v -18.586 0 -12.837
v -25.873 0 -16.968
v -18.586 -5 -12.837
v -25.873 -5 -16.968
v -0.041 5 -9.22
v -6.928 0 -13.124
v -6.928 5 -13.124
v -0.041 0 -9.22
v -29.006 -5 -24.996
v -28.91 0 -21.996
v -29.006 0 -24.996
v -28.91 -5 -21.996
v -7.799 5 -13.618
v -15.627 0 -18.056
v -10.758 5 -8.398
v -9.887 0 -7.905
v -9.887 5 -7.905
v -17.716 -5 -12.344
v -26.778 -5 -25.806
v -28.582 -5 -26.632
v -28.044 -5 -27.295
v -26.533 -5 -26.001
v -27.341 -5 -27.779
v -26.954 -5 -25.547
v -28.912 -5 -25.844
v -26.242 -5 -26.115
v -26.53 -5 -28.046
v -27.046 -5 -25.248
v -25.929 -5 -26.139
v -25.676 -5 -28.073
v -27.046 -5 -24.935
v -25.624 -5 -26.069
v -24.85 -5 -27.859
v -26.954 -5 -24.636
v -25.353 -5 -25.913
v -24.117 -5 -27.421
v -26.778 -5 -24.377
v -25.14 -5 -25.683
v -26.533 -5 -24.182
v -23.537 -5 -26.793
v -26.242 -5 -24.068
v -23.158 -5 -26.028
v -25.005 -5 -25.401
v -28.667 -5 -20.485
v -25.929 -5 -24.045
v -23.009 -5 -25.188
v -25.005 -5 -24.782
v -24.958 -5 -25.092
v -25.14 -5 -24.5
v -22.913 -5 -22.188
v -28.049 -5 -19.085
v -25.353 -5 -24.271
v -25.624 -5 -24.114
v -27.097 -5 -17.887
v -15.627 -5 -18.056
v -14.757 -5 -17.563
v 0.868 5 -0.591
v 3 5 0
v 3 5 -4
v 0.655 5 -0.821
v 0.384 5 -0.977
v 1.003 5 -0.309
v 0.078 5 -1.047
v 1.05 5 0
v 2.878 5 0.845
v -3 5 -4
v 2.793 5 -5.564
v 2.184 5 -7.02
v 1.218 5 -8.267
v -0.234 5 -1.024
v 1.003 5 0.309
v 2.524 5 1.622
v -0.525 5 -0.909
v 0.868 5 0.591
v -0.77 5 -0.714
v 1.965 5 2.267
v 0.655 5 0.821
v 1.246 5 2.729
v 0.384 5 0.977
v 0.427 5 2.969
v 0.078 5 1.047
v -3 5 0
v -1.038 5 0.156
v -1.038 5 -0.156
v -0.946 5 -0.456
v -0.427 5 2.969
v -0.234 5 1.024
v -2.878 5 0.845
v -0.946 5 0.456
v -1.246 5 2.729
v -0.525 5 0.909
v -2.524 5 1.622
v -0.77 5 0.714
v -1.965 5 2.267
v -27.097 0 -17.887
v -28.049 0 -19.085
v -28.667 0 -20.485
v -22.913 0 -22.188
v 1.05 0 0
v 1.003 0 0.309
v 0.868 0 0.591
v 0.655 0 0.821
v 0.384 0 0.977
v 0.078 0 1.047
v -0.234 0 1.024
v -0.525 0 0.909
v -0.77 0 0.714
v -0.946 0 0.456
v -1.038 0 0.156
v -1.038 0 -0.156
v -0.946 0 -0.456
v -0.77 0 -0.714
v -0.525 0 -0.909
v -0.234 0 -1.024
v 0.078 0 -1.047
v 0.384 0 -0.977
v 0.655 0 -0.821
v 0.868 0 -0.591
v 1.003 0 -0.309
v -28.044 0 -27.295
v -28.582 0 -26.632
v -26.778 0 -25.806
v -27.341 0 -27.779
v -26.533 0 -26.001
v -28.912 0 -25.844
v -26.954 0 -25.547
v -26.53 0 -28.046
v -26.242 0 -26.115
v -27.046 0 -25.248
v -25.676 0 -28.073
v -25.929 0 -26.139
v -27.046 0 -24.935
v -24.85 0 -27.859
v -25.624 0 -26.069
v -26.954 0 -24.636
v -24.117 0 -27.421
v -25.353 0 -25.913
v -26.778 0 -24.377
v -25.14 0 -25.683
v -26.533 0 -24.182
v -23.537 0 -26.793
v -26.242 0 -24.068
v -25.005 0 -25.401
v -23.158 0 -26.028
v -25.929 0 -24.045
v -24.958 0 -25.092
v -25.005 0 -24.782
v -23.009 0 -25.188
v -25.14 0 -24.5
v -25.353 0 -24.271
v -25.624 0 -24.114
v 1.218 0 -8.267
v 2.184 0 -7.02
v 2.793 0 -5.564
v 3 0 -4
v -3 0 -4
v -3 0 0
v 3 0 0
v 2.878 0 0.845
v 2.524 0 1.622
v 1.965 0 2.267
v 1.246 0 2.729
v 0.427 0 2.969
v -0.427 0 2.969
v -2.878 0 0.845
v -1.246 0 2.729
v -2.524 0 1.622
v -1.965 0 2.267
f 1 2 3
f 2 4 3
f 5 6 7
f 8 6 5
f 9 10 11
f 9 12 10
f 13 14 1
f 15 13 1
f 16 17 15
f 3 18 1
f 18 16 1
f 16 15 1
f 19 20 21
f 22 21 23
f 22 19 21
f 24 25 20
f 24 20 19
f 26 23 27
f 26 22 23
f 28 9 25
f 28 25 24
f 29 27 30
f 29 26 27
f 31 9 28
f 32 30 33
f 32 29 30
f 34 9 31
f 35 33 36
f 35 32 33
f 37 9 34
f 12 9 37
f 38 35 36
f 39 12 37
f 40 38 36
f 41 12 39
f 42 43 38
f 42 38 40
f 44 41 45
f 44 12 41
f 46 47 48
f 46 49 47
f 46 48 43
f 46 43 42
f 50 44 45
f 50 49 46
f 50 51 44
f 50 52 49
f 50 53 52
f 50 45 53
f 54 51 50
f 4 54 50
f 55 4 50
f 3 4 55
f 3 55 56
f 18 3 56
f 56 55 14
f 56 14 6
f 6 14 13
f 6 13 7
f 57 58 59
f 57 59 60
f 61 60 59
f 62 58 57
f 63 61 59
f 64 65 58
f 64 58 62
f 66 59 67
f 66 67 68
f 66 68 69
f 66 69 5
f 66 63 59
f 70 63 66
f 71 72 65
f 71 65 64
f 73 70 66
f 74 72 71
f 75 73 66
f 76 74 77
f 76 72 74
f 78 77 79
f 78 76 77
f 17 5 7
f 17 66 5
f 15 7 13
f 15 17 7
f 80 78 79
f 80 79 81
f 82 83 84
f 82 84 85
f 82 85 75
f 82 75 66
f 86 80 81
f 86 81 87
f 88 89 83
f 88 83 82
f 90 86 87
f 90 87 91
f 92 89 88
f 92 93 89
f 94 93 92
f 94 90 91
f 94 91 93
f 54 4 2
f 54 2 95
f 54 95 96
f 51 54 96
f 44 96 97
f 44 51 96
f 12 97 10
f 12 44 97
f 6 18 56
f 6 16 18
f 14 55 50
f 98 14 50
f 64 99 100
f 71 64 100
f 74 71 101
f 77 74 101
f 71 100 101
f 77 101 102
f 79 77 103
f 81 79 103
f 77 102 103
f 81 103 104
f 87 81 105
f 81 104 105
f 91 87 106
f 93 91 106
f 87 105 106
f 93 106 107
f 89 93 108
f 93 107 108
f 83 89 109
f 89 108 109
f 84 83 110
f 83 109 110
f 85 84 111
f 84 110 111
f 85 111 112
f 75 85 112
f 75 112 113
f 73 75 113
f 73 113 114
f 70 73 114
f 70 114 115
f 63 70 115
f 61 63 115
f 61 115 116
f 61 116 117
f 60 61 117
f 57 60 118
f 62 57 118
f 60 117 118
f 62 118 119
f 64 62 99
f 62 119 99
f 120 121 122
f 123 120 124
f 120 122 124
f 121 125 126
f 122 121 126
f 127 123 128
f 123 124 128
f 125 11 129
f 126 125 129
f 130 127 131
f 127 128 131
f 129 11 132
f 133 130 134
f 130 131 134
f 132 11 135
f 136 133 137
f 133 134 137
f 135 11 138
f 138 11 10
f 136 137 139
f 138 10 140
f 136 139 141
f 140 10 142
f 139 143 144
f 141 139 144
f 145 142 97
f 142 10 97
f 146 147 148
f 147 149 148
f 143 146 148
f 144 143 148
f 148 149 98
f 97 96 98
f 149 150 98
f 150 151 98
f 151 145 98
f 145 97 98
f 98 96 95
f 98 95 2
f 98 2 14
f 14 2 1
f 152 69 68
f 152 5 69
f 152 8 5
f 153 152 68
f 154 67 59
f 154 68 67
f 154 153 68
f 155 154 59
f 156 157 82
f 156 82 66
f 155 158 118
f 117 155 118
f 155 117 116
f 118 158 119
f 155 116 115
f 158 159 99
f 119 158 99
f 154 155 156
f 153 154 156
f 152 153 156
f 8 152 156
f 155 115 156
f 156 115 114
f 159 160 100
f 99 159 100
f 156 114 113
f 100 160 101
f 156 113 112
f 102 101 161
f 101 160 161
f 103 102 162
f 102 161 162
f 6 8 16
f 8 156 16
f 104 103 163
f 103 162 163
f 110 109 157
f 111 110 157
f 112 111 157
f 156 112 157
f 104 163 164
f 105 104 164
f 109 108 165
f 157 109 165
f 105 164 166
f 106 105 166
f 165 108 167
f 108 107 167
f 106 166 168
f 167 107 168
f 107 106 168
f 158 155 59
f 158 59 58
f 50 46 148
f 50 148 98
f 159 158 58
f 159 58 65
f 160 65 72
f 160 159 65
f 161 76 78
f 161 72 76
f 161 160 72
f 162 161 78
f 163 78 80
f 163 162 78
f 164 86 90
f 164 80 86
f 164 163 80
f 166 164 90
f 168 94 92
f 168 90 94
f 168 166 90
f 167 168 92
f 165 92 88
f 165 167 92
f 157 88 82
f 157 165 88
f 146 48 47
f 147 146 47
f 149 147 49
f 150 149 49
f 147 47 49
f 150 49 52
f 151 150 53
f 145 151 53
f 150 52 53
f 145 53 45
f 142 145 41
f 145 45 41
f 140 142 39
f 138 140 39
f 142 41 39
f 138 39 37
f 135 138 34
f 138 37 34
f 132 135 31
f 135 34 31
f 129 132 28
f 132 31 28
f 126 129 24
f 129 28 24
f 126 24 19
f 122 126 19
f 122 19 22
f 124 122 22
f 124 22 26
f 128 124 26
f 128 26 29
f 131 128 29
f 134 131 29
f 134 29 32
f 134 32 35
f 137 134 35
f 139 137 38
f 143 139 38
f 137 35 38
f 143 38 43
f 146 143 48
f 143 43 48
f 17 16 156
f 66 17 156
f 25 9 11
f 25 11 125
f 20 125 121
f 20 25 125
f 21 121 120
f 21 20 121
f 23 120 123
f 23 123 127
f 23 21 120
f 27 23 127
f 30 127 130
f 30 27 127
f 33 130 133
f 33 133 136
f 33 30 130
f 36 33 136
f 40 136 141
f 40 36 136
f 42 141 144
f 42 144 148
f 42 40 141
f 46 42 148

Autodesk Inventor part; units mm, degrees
ref_plane "YZ Plane" through (0, 0, 0) normal (1, 0, 0) x (0, 1, 0)
ref_plane "XZ Plane" through (0, 0, 0) normal (0, 1, 0) x (-1, 0, 0)
ref_plane "XY Plane" through (0, 0, 0) normal (0, 0, 1) x (1, 0, 0)
sketch "Skizze4" plane through (0, 0, 0) normal (0, 1, 0) x (-1, 0, 0)
  arc A0 (3, 0) -> (-3, 0) centre (0, 0) ccw
  line L0 (3, 0) -> (3, -4)
  line L1 (3, -4) -> (-3, -4) construction
  line L2 (-3, -4) -> (-3, 0)
  line L3 (29.4604, -19.0022) -> (26.5011, -24.2217) construction
  line L4 (26.5011, -24.2217) -> (6.9282, -13.1244) construction
  arc A1 (26.5011, -24.2217) -> (29.4604, -19.0022) centre (27.9808, -21.612) ccw construction
  line L5 (0, 0) -> (3, -1.7009) construction
  line L6 (-2.4661, -4.3495) -> (27.9808, -21.612) construction
  line L7 (27.9808, -21.612) -> (30.4468, -17.2624) construction
  line L8 (30.4468, -17.2624) -> (0, 0) construction
  line L9 (0, 0) -> (-2.4661, -4.3495) construction
  line L10 (-2.4661, -4.3495) -> (30.4468, -17.2624) construction
  line L11 (27.9808, -21.612) -> (0, 0) construction
  line L12 (9.8874, -7.905) -> (29.4604, -19.0022) construction
  line L13 (6.9282, -13.1244) -> (0.0407, -9.2195)
  line L14 (9.8874, -7.905) -> (6.9282, -13.1244)
  line L15 (9.8874, -7.905) -> (3, -4)
  arc A2 (-3, -4) -> (0.0407, -9.2195) centre (3, -4) ccw
  point P0 (13.9904, -10.806)
  dimension "d15" = 4
  dimension "d16" = 3
  dimension "d17" = 5
  dimension "d18" = 35
  dimension "d19" = 5
extrude "Extrusion4" add sketch "Skizze4" along normal blind 5
sketch "Skizze5" plane through (0, 0, 0) normal (0, -1, 0) x (1, 0, 0)
  line L0 (-9.8874, -7.905) -> (-29.4604, -19.0022) construction
  line L1 (-26.5011, -24.2217) -> (-6.9282, -13.1244) construction
  line L2 (-9.8874, -7.905) -> (-6.9282, -13.1244) projected
  line L3 (-15.6273, -18.0565) -> (-6.9282, -13.1244)
  line L4 (-6.9282, -13.1244) -> (-9.8874, -7.905)
  line L5 (-9.8874, -7.905) -> (-18.5865, -12.8371)
  line L6 (-18.5865, -12.8371) -> (-15.6273, -18.0565)
  line L7 (-15.6273, -18.0565) -> (-9.8874, -7.905) construction
  line L8 (-6.9282, -13.1244) -> (-18.5865, -12.8371) construction
  line L9 (-14.237, -10.371) -> (-11.2777, -15.5905) construction
  point P0 (0, 0)
  point P1 (-13.9904, -10.806)
  point P2 (-12.7573, -12.9808)
  point P3 (-12.7573, -12.9808)
extrude "Extrusion5" add sketch "Skizze5" along normal mid plane 10
sketch "Skizze6" plane through (0, -5, 0) normal (0, -1, 0) x (1, 0, 0)
  line L0 (-9.8874, -7.905) -> (-29.4604, -19.0022) construction
  arc A0 (-26.5011, -24.2217) -> (-29.4604, -19.0022) centre (-27.9808, -21.612) ccw construction
  line L1 (-26.5011, -24.2217) -> (-6.9282, -13.1244) construction
  line L2 (-18.5865, -12.8371) -> (-15.6273, -18.0565) projected
  line L3 (-25.8727, -16.9681) -> (-18.5865, -12.8371)
  line L4 (-15.6273, -18.0565) -> (-22.9134, -22.1876)
  arc A1 (-25.8727, -16.9681) -> (-28.9104, -21.9956) centre (-22.9134, -22.1876) ccw
  line L5 (-27.9808, -21.612) -> (-26.0079, -25.0916) construction
  arc A2 (-29.0064, -24.9956) -> (-23.0094, -25.1876) centre (-26.0079, -25.0916) ccw
  line L6 (-28.9104, -21.9956) -> (-29.0064, -24.9956)
  line L7 (-23.0094, -25.1876) -> (-22.9134, -22.1876)
  point P0 (0, 0)
  dimension "d45" = 4
  dimension "d46" = 3
extrude "Extrusion6" add sketch "Skizze6" against normal blind 5
sketch "Skizze7" plane through (0, 0, 0) normal (0, -1, 0) x (1, 0, 0)
  circle A0 centre (0, 0) radius 1.05
  dimension "d26" = 2.1
extrude "Extrusion7" cut sketch "Skizze7" against normal up to next
sketch "Skizze8" plane through (0, -5, 0) normal (0, -1, 0) x (1, 0, 0)
  arc A0 (-29.0064, -24.9956) -> (-23.0094, -25.1876) centre (-26.0079, -25.0916) ccw construction
  circle A1 centre (-26.0079, -25.0916) radius 1.05
  point P0 (0, 0)
  dimension "d47" = 2.1
extrude "Extrusion8" cut sketch "Skizze8" against normal up to next
chamfer "Fase2" distance 9 distance2 5 1 edges at (-17.1069, 5, -15.4468) measured on face at (-7.2091, 5, -8.6855)
chamfer "Fase3" distance 9 distance2 5 1 edges at (-8.4078, -5, -10.5147) measured on face at (-19.5579, -5, -15.6869)
fillet "Rundung2" [suppressed]
properties part number "LegConnector" material "ABS-Kunststoff"
